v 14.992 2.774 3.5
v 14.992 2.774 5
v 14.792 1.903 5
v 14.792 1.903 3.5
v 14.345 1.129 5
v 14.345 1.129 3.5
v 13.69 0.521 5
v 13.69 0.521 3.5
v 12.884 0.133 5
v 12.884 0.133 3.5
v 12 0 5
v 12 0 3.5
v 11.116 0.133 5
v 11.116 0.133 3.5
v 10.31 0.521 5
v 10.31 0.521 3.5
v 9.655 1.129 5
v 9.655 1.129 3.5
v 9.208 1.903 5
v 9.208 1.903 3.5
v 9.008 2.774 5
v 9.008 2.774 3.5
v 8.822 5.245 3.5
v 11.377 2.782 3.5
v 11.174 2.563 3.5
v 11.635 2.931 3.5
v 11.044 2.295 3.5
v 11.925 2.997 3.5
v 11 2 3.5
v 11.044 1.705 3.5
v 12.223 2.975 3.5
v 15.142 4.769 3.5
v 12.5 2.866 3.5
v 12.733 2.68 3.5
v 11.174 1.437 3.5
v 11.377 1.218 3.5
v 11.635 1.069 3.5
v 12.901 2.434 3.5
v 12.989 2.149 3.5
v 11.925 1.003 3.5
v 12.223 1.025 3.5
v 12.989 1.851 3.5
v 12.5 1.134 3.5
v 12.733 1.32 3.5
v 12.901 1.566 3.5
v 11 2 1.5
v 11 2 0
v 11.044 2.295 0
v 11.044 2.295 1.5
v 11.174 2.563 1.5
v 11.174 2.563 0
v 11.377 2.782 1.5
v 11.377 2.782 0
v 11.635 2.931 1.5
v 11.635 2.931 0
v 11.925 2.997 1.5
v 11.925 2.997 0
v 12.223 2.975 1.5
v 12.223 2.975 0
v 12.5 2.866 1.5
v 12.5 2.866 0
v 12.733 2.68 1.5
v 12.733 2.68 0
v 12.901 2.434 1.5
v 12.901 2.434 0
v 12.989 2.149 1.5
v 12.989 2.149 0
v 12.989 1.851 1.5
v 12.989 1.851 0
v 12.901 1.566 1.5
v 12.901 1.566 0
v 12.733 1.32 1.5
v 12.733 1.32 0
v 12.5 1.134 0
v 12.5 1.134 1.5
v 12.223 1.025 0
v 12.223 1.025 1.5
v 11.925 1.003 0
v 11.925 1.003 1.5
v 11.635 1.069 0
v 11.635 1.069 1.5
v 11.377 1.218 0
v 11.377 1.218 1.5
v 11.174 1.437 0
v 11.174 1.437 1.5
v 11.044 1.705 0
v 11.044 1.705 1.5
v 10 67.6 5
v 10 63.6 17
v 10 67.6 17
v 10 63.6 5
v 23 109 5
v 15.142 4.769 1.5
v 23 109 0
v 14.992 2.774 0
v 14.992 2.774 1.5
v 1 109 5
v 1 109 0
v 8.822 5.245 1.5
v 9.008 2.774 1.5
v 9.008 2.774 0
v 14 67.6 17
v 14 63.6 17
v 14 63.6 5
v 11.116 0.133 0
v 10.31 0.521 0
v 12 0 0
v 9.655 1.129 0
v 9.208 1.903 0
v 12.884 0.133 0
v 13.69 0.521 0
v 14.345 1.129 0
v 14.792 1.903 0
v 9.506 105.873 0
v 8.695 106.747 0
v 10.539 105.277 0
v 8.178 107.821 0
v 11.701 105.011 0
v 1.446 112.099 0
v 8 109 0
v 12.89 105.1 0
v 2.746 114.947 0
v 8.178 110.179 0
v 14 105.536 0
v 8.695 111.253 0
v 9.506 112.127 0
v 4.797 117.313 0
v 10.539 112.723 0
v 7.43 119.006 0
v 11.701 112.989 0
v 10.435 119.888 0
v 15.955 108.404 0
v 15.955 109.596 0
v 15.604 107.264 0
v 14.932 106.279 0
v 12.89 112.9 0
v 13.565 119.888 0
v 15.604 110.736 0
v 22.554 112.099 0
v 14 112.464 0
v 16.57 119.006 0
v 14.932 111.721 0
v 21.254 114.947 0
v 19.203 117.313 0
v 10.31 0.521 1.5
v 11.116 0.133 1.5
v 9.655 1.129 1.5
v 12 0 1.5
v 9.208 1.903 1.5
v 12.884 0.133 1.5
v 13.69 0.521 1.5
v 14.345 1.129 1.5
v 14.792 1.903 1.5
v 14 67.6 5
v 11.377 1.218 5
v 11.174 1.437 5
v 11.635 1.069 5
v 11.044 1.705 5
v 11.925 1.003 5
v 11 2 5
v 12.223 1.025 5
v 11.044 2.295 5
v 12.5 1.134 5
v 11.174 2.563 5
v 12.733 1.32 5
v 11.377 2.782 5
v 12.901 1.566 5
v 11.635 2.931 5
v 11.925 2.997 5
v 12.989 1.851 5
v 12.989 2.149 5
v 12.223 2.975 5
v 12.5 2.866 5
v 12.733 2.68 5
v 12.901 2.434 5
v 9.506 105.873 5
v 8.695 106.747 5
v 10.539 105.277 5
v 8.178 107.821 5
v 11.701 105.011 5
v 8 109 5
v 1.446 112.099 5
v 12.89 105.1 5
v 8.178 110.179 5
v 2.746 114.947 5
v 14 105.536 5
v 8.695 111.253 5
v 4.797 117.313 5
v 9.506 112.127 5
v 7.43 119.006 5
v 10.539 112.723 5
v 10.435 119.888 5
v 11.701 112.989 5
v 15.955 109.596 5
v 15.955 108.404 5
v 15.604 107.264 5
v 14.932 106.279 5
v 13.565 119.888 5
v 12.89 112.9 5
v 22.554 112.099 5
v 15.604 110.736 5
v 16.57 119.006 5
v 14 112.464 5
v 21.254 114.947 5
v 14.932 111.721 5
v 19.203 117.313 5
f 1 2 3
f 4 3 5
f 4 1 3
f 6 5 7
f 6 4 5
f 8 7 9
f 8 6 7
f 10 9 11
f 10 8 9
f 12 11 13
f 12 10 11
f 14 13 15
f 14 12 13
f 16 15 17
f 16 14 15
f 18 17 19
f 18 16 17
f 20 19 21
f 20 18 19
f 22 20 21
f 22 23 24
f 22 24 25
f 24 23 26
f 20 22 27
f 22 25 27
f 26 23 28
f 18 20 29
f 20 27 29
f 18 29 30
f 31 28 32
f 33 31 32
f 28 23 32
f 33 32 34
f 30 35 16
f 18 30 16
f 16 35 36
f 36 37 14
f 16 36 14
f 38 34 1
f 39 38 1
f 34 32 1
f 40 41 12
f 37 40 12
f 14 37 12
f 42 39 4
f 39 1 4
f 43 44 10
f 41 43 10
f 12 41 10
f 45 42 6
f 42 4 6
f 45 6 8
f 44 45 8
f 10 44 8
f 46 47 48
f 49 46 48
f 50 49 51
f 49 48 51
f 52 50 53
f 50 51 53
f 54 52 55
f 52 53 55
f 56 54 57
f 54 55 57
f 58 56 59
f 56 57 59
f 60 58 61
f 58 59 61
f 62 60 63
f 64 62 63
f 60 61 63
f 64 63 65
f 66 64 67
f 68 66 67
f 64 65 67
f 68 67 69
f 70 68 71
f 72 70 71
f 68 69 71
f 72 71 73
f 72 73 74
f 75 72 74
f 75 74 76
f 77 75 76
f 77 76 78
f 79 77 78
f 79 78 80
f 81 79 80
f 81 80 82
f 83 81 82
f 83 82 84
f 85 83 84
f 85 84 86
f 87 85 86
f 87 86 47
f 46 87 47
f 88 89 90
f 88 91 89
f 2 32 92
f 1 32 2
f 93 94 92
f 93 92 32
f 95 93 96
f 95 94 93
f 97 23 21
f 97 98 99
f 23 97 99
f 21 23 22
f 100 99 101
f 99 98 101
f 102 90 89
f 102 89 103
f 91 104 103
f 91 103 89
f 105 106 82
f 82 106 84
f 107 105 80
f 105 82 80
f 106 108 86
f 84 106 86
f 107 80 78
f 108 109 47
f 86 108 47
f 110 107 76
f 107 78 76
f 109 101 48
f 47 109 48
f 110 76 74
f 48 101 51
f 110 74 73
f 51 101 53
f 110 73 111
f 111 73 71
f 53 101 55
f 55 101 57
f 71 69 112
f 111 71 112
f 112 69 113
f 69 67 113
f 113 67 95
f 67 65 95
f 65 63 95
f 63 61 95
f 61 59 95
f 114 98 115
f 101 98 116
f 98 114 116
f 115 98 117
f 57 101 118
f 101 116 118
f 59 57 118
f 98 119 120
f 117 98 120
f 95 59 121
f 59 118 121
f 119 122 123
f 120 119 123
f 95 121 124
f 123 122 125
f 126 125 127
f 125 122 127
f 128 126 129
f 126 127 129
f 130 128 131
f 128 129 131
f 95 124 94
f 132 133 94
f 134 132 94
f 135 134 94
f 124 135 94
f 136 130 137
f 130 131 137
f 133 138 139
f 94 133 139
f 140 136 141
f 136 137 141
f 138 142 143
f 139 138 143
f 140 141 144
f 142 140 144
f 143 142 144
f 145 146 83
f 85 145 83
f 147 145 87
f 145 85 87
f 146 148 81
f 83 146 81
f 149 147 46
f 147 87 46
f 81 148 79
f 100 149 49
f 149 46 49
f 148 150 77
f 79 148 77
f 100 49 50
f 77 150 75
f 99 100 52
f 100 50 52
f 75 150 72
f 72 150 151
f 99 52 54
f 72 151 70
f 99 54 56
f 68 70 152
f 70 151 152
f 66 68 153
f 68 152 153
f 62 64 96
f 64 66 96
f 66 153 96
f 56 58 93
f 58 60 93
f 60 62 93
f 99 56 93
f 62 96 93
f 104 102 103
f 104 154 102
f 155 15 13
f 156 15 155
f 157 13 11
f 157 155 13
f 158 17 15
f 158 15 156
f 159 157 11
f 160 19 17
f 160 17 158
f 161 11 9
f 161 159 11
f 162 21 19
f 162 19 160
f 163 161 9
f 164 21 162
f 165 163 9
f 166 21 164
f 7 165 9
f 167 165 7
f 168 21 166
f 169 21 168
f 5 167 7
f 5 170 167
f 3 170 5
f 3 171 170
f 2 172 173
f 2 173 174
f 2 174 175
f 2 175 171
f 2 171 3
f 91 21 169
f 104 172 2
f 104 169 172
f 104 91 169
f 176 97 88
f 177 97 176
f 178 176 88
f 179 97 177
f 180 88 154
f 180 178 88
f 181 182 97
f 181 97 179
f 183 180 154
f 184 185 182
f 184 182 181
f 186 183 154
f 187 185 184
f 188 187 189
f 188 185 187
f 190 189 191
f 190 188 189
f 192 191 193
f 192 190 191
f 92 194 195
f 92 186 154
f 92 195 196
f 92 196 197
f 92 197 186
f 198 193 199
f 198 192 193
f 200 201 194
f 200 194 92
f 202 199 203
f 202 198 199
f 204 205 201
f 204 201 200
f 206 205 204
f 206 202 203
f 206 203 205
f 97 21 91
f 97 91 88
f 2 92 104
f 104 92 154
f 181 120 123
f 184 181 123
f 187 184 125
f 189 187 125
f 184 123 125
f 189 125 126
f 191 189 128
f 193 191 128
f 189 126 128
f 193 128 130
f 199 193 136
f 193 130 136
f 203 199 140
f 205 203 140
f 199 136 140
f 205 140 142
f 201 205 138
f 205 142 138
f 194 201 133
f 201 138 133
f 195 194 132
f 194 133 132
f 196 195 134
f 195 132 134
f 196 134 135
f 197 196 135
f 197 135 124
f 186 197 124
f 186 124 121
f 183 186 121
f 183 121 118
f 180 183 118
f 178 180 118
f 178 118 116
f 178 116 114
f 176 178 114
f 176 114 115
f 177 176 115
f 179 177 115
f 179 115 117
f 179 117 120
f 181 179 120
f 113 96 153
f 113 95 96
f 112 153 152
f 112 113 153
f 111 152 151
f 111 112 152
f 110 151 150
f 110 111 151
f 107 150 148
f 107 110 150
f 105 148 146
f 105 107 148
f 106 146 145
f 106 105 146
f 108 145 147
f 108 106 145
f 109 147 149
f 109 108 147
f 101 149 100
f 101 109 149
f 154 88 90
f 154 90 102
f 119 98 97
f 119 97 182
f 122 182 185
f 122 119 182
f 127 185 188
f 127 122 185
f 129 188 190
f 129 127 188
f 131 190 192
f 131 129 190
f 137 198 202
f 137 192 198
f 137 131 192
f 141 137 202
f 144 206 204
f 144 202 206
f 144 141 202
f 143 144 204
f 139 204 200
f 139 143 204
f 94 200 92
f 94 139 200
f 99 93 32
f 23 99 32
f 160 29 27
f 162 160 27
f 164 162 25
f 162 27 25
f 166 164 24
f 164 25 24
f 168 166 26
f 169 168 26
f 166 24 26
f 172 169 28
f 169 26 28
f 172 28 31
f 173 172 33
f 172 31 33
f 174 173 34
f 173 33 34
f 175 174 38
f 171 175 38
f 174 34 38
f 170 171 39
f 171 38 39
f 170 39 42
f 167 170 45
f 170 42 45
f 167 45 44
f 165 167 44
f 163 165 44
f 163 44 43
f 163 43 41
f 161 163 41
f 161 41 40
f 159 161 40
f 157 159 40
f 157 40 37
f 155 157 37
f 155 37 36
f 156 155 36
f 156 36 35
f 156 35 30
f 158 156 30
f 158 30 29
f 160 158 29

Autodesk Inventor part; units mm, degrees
ref_plane "YZ Plane" through (0, 0, 0) normal (1, 0, 0) x (0, 1, 0)
ref_plane "XZ Plane" through (0, 0, 0) normal (0, 1, 0) x (-1, 0, 0)
ref_plane "XY Plane" through (0, 0, 0) normal (0, 0, 1) x (1, 0, 0)
sketch "Esquisse1" plane through (0, 0, 0) normal (0, 0, 1) x (1, 0, 0)
  arc A0 (22.8757, 107.3508) -> (1.1243, 107.3508) centre (12, 109) ccw
  arc A1 (9.0085, 2.7745) -> (14.9915, 2.7745) centre (12, 3) ccw
  line L0 (1, 109) -> (9.0085, 2.7745)
  line L1 (23, 109) -> (14.9915, 2.7745)
  point P0 (0, 0)
  dimension "d2" = 22
extrude "Extrusion1" add sketch "Esquisse1" along normal blind 5 contours L1 A1 L0 A0
sketch "Esquisse2" plane through (23, 109, 5) normal (0.9971701, -0.075178, 0) x (0, 0, -1)
  line L0 (5, -109.527) -> (0, -109.527) projected
  line L1 (2.5, -109.527) -> (1.5, -109.527)
  line L2 (2.5, -109.527) -> (3.5, -109.527)
  line L3 (3.5, -109.527) -> (3.5, -104.527)
  line L4 (3.5, -104.527) -> (1.5, -104.527)
  line L5 (1.5, -104.527) -> (1.5, -109.527)
  point P0 (5, -110.4206)
  dimension "d6" = 1
  dimension "d7" = 1
  dimension "d8" = 5
  dimension "d9" = 2
extrude "Extrusion2" cut sketch "Esquisse2" against normal through all
sketch "Esquisse3" plane through (0, 0, 0) normal (0, 0, -1) x (-1, 0, 0)
  arc A0 (-14.9915, 2.7745) -> (-9.0085, 2.7745) centre (-12, 3) ccw projected
  arc A1 (-1, 109) -> (-23, 109) centre (-12, 109) ccw projected
  circle A2 centre (-12, 109) radius 4
  arc A3 (-14.9915, 2.7745) -> (-9.0085, 2.7745) centre (-12, 3) ccw projected
  line L0 (-12, 0) -> (-12, 2)
  circle A4 centre (-12, 2) radius 1
  line L1 (-14.8284, 2) -> (-9.1716, 2)
  point P0 (0, 0)
  dimension "d13" = 8
  dimension "d24" = 2
  dimension "d25" = 2
  dimension "d26" = 5.6569
extrude "Extrusion3" cut sketch "Esquisse3" against normal through all contours L1 L0 A4 | A4 L1 | L0 L1 A4 | A2
sketch "Esquisse8" plane through (0, 0, 5) normal (0, 0, 1) x (1, 0, 0)
  circle A0 centre (12, 109) radius 4 projected
  line L0 (12, 109) -> (12, 65.6)
  line L1 (12, 65.6) -> (12, 67.6)
  line L2 (12, 67.6) -> (14, 67.6)
  line L3 (14, 67.6) -> (14, 63.6)
  line L4 (14, 63.6) -> (10, 63.6)
  line L5 (10, 63.6) -> (10, 67.6)
  line L6 (10, 67.6) -> (12, 67.6)
  point P0 (0, 0)
  dimension "d27" = 43.4
  dimension "d29" = 2
  dimension "d30" = 2
  dimension "d31" = 4
  dimension "d32" = 4
extrude "Extrusion5" add sketch "Esquisse8" along normal blind 12 contours L2 L3 L4 L5 L6
properties part number "Jambe"
